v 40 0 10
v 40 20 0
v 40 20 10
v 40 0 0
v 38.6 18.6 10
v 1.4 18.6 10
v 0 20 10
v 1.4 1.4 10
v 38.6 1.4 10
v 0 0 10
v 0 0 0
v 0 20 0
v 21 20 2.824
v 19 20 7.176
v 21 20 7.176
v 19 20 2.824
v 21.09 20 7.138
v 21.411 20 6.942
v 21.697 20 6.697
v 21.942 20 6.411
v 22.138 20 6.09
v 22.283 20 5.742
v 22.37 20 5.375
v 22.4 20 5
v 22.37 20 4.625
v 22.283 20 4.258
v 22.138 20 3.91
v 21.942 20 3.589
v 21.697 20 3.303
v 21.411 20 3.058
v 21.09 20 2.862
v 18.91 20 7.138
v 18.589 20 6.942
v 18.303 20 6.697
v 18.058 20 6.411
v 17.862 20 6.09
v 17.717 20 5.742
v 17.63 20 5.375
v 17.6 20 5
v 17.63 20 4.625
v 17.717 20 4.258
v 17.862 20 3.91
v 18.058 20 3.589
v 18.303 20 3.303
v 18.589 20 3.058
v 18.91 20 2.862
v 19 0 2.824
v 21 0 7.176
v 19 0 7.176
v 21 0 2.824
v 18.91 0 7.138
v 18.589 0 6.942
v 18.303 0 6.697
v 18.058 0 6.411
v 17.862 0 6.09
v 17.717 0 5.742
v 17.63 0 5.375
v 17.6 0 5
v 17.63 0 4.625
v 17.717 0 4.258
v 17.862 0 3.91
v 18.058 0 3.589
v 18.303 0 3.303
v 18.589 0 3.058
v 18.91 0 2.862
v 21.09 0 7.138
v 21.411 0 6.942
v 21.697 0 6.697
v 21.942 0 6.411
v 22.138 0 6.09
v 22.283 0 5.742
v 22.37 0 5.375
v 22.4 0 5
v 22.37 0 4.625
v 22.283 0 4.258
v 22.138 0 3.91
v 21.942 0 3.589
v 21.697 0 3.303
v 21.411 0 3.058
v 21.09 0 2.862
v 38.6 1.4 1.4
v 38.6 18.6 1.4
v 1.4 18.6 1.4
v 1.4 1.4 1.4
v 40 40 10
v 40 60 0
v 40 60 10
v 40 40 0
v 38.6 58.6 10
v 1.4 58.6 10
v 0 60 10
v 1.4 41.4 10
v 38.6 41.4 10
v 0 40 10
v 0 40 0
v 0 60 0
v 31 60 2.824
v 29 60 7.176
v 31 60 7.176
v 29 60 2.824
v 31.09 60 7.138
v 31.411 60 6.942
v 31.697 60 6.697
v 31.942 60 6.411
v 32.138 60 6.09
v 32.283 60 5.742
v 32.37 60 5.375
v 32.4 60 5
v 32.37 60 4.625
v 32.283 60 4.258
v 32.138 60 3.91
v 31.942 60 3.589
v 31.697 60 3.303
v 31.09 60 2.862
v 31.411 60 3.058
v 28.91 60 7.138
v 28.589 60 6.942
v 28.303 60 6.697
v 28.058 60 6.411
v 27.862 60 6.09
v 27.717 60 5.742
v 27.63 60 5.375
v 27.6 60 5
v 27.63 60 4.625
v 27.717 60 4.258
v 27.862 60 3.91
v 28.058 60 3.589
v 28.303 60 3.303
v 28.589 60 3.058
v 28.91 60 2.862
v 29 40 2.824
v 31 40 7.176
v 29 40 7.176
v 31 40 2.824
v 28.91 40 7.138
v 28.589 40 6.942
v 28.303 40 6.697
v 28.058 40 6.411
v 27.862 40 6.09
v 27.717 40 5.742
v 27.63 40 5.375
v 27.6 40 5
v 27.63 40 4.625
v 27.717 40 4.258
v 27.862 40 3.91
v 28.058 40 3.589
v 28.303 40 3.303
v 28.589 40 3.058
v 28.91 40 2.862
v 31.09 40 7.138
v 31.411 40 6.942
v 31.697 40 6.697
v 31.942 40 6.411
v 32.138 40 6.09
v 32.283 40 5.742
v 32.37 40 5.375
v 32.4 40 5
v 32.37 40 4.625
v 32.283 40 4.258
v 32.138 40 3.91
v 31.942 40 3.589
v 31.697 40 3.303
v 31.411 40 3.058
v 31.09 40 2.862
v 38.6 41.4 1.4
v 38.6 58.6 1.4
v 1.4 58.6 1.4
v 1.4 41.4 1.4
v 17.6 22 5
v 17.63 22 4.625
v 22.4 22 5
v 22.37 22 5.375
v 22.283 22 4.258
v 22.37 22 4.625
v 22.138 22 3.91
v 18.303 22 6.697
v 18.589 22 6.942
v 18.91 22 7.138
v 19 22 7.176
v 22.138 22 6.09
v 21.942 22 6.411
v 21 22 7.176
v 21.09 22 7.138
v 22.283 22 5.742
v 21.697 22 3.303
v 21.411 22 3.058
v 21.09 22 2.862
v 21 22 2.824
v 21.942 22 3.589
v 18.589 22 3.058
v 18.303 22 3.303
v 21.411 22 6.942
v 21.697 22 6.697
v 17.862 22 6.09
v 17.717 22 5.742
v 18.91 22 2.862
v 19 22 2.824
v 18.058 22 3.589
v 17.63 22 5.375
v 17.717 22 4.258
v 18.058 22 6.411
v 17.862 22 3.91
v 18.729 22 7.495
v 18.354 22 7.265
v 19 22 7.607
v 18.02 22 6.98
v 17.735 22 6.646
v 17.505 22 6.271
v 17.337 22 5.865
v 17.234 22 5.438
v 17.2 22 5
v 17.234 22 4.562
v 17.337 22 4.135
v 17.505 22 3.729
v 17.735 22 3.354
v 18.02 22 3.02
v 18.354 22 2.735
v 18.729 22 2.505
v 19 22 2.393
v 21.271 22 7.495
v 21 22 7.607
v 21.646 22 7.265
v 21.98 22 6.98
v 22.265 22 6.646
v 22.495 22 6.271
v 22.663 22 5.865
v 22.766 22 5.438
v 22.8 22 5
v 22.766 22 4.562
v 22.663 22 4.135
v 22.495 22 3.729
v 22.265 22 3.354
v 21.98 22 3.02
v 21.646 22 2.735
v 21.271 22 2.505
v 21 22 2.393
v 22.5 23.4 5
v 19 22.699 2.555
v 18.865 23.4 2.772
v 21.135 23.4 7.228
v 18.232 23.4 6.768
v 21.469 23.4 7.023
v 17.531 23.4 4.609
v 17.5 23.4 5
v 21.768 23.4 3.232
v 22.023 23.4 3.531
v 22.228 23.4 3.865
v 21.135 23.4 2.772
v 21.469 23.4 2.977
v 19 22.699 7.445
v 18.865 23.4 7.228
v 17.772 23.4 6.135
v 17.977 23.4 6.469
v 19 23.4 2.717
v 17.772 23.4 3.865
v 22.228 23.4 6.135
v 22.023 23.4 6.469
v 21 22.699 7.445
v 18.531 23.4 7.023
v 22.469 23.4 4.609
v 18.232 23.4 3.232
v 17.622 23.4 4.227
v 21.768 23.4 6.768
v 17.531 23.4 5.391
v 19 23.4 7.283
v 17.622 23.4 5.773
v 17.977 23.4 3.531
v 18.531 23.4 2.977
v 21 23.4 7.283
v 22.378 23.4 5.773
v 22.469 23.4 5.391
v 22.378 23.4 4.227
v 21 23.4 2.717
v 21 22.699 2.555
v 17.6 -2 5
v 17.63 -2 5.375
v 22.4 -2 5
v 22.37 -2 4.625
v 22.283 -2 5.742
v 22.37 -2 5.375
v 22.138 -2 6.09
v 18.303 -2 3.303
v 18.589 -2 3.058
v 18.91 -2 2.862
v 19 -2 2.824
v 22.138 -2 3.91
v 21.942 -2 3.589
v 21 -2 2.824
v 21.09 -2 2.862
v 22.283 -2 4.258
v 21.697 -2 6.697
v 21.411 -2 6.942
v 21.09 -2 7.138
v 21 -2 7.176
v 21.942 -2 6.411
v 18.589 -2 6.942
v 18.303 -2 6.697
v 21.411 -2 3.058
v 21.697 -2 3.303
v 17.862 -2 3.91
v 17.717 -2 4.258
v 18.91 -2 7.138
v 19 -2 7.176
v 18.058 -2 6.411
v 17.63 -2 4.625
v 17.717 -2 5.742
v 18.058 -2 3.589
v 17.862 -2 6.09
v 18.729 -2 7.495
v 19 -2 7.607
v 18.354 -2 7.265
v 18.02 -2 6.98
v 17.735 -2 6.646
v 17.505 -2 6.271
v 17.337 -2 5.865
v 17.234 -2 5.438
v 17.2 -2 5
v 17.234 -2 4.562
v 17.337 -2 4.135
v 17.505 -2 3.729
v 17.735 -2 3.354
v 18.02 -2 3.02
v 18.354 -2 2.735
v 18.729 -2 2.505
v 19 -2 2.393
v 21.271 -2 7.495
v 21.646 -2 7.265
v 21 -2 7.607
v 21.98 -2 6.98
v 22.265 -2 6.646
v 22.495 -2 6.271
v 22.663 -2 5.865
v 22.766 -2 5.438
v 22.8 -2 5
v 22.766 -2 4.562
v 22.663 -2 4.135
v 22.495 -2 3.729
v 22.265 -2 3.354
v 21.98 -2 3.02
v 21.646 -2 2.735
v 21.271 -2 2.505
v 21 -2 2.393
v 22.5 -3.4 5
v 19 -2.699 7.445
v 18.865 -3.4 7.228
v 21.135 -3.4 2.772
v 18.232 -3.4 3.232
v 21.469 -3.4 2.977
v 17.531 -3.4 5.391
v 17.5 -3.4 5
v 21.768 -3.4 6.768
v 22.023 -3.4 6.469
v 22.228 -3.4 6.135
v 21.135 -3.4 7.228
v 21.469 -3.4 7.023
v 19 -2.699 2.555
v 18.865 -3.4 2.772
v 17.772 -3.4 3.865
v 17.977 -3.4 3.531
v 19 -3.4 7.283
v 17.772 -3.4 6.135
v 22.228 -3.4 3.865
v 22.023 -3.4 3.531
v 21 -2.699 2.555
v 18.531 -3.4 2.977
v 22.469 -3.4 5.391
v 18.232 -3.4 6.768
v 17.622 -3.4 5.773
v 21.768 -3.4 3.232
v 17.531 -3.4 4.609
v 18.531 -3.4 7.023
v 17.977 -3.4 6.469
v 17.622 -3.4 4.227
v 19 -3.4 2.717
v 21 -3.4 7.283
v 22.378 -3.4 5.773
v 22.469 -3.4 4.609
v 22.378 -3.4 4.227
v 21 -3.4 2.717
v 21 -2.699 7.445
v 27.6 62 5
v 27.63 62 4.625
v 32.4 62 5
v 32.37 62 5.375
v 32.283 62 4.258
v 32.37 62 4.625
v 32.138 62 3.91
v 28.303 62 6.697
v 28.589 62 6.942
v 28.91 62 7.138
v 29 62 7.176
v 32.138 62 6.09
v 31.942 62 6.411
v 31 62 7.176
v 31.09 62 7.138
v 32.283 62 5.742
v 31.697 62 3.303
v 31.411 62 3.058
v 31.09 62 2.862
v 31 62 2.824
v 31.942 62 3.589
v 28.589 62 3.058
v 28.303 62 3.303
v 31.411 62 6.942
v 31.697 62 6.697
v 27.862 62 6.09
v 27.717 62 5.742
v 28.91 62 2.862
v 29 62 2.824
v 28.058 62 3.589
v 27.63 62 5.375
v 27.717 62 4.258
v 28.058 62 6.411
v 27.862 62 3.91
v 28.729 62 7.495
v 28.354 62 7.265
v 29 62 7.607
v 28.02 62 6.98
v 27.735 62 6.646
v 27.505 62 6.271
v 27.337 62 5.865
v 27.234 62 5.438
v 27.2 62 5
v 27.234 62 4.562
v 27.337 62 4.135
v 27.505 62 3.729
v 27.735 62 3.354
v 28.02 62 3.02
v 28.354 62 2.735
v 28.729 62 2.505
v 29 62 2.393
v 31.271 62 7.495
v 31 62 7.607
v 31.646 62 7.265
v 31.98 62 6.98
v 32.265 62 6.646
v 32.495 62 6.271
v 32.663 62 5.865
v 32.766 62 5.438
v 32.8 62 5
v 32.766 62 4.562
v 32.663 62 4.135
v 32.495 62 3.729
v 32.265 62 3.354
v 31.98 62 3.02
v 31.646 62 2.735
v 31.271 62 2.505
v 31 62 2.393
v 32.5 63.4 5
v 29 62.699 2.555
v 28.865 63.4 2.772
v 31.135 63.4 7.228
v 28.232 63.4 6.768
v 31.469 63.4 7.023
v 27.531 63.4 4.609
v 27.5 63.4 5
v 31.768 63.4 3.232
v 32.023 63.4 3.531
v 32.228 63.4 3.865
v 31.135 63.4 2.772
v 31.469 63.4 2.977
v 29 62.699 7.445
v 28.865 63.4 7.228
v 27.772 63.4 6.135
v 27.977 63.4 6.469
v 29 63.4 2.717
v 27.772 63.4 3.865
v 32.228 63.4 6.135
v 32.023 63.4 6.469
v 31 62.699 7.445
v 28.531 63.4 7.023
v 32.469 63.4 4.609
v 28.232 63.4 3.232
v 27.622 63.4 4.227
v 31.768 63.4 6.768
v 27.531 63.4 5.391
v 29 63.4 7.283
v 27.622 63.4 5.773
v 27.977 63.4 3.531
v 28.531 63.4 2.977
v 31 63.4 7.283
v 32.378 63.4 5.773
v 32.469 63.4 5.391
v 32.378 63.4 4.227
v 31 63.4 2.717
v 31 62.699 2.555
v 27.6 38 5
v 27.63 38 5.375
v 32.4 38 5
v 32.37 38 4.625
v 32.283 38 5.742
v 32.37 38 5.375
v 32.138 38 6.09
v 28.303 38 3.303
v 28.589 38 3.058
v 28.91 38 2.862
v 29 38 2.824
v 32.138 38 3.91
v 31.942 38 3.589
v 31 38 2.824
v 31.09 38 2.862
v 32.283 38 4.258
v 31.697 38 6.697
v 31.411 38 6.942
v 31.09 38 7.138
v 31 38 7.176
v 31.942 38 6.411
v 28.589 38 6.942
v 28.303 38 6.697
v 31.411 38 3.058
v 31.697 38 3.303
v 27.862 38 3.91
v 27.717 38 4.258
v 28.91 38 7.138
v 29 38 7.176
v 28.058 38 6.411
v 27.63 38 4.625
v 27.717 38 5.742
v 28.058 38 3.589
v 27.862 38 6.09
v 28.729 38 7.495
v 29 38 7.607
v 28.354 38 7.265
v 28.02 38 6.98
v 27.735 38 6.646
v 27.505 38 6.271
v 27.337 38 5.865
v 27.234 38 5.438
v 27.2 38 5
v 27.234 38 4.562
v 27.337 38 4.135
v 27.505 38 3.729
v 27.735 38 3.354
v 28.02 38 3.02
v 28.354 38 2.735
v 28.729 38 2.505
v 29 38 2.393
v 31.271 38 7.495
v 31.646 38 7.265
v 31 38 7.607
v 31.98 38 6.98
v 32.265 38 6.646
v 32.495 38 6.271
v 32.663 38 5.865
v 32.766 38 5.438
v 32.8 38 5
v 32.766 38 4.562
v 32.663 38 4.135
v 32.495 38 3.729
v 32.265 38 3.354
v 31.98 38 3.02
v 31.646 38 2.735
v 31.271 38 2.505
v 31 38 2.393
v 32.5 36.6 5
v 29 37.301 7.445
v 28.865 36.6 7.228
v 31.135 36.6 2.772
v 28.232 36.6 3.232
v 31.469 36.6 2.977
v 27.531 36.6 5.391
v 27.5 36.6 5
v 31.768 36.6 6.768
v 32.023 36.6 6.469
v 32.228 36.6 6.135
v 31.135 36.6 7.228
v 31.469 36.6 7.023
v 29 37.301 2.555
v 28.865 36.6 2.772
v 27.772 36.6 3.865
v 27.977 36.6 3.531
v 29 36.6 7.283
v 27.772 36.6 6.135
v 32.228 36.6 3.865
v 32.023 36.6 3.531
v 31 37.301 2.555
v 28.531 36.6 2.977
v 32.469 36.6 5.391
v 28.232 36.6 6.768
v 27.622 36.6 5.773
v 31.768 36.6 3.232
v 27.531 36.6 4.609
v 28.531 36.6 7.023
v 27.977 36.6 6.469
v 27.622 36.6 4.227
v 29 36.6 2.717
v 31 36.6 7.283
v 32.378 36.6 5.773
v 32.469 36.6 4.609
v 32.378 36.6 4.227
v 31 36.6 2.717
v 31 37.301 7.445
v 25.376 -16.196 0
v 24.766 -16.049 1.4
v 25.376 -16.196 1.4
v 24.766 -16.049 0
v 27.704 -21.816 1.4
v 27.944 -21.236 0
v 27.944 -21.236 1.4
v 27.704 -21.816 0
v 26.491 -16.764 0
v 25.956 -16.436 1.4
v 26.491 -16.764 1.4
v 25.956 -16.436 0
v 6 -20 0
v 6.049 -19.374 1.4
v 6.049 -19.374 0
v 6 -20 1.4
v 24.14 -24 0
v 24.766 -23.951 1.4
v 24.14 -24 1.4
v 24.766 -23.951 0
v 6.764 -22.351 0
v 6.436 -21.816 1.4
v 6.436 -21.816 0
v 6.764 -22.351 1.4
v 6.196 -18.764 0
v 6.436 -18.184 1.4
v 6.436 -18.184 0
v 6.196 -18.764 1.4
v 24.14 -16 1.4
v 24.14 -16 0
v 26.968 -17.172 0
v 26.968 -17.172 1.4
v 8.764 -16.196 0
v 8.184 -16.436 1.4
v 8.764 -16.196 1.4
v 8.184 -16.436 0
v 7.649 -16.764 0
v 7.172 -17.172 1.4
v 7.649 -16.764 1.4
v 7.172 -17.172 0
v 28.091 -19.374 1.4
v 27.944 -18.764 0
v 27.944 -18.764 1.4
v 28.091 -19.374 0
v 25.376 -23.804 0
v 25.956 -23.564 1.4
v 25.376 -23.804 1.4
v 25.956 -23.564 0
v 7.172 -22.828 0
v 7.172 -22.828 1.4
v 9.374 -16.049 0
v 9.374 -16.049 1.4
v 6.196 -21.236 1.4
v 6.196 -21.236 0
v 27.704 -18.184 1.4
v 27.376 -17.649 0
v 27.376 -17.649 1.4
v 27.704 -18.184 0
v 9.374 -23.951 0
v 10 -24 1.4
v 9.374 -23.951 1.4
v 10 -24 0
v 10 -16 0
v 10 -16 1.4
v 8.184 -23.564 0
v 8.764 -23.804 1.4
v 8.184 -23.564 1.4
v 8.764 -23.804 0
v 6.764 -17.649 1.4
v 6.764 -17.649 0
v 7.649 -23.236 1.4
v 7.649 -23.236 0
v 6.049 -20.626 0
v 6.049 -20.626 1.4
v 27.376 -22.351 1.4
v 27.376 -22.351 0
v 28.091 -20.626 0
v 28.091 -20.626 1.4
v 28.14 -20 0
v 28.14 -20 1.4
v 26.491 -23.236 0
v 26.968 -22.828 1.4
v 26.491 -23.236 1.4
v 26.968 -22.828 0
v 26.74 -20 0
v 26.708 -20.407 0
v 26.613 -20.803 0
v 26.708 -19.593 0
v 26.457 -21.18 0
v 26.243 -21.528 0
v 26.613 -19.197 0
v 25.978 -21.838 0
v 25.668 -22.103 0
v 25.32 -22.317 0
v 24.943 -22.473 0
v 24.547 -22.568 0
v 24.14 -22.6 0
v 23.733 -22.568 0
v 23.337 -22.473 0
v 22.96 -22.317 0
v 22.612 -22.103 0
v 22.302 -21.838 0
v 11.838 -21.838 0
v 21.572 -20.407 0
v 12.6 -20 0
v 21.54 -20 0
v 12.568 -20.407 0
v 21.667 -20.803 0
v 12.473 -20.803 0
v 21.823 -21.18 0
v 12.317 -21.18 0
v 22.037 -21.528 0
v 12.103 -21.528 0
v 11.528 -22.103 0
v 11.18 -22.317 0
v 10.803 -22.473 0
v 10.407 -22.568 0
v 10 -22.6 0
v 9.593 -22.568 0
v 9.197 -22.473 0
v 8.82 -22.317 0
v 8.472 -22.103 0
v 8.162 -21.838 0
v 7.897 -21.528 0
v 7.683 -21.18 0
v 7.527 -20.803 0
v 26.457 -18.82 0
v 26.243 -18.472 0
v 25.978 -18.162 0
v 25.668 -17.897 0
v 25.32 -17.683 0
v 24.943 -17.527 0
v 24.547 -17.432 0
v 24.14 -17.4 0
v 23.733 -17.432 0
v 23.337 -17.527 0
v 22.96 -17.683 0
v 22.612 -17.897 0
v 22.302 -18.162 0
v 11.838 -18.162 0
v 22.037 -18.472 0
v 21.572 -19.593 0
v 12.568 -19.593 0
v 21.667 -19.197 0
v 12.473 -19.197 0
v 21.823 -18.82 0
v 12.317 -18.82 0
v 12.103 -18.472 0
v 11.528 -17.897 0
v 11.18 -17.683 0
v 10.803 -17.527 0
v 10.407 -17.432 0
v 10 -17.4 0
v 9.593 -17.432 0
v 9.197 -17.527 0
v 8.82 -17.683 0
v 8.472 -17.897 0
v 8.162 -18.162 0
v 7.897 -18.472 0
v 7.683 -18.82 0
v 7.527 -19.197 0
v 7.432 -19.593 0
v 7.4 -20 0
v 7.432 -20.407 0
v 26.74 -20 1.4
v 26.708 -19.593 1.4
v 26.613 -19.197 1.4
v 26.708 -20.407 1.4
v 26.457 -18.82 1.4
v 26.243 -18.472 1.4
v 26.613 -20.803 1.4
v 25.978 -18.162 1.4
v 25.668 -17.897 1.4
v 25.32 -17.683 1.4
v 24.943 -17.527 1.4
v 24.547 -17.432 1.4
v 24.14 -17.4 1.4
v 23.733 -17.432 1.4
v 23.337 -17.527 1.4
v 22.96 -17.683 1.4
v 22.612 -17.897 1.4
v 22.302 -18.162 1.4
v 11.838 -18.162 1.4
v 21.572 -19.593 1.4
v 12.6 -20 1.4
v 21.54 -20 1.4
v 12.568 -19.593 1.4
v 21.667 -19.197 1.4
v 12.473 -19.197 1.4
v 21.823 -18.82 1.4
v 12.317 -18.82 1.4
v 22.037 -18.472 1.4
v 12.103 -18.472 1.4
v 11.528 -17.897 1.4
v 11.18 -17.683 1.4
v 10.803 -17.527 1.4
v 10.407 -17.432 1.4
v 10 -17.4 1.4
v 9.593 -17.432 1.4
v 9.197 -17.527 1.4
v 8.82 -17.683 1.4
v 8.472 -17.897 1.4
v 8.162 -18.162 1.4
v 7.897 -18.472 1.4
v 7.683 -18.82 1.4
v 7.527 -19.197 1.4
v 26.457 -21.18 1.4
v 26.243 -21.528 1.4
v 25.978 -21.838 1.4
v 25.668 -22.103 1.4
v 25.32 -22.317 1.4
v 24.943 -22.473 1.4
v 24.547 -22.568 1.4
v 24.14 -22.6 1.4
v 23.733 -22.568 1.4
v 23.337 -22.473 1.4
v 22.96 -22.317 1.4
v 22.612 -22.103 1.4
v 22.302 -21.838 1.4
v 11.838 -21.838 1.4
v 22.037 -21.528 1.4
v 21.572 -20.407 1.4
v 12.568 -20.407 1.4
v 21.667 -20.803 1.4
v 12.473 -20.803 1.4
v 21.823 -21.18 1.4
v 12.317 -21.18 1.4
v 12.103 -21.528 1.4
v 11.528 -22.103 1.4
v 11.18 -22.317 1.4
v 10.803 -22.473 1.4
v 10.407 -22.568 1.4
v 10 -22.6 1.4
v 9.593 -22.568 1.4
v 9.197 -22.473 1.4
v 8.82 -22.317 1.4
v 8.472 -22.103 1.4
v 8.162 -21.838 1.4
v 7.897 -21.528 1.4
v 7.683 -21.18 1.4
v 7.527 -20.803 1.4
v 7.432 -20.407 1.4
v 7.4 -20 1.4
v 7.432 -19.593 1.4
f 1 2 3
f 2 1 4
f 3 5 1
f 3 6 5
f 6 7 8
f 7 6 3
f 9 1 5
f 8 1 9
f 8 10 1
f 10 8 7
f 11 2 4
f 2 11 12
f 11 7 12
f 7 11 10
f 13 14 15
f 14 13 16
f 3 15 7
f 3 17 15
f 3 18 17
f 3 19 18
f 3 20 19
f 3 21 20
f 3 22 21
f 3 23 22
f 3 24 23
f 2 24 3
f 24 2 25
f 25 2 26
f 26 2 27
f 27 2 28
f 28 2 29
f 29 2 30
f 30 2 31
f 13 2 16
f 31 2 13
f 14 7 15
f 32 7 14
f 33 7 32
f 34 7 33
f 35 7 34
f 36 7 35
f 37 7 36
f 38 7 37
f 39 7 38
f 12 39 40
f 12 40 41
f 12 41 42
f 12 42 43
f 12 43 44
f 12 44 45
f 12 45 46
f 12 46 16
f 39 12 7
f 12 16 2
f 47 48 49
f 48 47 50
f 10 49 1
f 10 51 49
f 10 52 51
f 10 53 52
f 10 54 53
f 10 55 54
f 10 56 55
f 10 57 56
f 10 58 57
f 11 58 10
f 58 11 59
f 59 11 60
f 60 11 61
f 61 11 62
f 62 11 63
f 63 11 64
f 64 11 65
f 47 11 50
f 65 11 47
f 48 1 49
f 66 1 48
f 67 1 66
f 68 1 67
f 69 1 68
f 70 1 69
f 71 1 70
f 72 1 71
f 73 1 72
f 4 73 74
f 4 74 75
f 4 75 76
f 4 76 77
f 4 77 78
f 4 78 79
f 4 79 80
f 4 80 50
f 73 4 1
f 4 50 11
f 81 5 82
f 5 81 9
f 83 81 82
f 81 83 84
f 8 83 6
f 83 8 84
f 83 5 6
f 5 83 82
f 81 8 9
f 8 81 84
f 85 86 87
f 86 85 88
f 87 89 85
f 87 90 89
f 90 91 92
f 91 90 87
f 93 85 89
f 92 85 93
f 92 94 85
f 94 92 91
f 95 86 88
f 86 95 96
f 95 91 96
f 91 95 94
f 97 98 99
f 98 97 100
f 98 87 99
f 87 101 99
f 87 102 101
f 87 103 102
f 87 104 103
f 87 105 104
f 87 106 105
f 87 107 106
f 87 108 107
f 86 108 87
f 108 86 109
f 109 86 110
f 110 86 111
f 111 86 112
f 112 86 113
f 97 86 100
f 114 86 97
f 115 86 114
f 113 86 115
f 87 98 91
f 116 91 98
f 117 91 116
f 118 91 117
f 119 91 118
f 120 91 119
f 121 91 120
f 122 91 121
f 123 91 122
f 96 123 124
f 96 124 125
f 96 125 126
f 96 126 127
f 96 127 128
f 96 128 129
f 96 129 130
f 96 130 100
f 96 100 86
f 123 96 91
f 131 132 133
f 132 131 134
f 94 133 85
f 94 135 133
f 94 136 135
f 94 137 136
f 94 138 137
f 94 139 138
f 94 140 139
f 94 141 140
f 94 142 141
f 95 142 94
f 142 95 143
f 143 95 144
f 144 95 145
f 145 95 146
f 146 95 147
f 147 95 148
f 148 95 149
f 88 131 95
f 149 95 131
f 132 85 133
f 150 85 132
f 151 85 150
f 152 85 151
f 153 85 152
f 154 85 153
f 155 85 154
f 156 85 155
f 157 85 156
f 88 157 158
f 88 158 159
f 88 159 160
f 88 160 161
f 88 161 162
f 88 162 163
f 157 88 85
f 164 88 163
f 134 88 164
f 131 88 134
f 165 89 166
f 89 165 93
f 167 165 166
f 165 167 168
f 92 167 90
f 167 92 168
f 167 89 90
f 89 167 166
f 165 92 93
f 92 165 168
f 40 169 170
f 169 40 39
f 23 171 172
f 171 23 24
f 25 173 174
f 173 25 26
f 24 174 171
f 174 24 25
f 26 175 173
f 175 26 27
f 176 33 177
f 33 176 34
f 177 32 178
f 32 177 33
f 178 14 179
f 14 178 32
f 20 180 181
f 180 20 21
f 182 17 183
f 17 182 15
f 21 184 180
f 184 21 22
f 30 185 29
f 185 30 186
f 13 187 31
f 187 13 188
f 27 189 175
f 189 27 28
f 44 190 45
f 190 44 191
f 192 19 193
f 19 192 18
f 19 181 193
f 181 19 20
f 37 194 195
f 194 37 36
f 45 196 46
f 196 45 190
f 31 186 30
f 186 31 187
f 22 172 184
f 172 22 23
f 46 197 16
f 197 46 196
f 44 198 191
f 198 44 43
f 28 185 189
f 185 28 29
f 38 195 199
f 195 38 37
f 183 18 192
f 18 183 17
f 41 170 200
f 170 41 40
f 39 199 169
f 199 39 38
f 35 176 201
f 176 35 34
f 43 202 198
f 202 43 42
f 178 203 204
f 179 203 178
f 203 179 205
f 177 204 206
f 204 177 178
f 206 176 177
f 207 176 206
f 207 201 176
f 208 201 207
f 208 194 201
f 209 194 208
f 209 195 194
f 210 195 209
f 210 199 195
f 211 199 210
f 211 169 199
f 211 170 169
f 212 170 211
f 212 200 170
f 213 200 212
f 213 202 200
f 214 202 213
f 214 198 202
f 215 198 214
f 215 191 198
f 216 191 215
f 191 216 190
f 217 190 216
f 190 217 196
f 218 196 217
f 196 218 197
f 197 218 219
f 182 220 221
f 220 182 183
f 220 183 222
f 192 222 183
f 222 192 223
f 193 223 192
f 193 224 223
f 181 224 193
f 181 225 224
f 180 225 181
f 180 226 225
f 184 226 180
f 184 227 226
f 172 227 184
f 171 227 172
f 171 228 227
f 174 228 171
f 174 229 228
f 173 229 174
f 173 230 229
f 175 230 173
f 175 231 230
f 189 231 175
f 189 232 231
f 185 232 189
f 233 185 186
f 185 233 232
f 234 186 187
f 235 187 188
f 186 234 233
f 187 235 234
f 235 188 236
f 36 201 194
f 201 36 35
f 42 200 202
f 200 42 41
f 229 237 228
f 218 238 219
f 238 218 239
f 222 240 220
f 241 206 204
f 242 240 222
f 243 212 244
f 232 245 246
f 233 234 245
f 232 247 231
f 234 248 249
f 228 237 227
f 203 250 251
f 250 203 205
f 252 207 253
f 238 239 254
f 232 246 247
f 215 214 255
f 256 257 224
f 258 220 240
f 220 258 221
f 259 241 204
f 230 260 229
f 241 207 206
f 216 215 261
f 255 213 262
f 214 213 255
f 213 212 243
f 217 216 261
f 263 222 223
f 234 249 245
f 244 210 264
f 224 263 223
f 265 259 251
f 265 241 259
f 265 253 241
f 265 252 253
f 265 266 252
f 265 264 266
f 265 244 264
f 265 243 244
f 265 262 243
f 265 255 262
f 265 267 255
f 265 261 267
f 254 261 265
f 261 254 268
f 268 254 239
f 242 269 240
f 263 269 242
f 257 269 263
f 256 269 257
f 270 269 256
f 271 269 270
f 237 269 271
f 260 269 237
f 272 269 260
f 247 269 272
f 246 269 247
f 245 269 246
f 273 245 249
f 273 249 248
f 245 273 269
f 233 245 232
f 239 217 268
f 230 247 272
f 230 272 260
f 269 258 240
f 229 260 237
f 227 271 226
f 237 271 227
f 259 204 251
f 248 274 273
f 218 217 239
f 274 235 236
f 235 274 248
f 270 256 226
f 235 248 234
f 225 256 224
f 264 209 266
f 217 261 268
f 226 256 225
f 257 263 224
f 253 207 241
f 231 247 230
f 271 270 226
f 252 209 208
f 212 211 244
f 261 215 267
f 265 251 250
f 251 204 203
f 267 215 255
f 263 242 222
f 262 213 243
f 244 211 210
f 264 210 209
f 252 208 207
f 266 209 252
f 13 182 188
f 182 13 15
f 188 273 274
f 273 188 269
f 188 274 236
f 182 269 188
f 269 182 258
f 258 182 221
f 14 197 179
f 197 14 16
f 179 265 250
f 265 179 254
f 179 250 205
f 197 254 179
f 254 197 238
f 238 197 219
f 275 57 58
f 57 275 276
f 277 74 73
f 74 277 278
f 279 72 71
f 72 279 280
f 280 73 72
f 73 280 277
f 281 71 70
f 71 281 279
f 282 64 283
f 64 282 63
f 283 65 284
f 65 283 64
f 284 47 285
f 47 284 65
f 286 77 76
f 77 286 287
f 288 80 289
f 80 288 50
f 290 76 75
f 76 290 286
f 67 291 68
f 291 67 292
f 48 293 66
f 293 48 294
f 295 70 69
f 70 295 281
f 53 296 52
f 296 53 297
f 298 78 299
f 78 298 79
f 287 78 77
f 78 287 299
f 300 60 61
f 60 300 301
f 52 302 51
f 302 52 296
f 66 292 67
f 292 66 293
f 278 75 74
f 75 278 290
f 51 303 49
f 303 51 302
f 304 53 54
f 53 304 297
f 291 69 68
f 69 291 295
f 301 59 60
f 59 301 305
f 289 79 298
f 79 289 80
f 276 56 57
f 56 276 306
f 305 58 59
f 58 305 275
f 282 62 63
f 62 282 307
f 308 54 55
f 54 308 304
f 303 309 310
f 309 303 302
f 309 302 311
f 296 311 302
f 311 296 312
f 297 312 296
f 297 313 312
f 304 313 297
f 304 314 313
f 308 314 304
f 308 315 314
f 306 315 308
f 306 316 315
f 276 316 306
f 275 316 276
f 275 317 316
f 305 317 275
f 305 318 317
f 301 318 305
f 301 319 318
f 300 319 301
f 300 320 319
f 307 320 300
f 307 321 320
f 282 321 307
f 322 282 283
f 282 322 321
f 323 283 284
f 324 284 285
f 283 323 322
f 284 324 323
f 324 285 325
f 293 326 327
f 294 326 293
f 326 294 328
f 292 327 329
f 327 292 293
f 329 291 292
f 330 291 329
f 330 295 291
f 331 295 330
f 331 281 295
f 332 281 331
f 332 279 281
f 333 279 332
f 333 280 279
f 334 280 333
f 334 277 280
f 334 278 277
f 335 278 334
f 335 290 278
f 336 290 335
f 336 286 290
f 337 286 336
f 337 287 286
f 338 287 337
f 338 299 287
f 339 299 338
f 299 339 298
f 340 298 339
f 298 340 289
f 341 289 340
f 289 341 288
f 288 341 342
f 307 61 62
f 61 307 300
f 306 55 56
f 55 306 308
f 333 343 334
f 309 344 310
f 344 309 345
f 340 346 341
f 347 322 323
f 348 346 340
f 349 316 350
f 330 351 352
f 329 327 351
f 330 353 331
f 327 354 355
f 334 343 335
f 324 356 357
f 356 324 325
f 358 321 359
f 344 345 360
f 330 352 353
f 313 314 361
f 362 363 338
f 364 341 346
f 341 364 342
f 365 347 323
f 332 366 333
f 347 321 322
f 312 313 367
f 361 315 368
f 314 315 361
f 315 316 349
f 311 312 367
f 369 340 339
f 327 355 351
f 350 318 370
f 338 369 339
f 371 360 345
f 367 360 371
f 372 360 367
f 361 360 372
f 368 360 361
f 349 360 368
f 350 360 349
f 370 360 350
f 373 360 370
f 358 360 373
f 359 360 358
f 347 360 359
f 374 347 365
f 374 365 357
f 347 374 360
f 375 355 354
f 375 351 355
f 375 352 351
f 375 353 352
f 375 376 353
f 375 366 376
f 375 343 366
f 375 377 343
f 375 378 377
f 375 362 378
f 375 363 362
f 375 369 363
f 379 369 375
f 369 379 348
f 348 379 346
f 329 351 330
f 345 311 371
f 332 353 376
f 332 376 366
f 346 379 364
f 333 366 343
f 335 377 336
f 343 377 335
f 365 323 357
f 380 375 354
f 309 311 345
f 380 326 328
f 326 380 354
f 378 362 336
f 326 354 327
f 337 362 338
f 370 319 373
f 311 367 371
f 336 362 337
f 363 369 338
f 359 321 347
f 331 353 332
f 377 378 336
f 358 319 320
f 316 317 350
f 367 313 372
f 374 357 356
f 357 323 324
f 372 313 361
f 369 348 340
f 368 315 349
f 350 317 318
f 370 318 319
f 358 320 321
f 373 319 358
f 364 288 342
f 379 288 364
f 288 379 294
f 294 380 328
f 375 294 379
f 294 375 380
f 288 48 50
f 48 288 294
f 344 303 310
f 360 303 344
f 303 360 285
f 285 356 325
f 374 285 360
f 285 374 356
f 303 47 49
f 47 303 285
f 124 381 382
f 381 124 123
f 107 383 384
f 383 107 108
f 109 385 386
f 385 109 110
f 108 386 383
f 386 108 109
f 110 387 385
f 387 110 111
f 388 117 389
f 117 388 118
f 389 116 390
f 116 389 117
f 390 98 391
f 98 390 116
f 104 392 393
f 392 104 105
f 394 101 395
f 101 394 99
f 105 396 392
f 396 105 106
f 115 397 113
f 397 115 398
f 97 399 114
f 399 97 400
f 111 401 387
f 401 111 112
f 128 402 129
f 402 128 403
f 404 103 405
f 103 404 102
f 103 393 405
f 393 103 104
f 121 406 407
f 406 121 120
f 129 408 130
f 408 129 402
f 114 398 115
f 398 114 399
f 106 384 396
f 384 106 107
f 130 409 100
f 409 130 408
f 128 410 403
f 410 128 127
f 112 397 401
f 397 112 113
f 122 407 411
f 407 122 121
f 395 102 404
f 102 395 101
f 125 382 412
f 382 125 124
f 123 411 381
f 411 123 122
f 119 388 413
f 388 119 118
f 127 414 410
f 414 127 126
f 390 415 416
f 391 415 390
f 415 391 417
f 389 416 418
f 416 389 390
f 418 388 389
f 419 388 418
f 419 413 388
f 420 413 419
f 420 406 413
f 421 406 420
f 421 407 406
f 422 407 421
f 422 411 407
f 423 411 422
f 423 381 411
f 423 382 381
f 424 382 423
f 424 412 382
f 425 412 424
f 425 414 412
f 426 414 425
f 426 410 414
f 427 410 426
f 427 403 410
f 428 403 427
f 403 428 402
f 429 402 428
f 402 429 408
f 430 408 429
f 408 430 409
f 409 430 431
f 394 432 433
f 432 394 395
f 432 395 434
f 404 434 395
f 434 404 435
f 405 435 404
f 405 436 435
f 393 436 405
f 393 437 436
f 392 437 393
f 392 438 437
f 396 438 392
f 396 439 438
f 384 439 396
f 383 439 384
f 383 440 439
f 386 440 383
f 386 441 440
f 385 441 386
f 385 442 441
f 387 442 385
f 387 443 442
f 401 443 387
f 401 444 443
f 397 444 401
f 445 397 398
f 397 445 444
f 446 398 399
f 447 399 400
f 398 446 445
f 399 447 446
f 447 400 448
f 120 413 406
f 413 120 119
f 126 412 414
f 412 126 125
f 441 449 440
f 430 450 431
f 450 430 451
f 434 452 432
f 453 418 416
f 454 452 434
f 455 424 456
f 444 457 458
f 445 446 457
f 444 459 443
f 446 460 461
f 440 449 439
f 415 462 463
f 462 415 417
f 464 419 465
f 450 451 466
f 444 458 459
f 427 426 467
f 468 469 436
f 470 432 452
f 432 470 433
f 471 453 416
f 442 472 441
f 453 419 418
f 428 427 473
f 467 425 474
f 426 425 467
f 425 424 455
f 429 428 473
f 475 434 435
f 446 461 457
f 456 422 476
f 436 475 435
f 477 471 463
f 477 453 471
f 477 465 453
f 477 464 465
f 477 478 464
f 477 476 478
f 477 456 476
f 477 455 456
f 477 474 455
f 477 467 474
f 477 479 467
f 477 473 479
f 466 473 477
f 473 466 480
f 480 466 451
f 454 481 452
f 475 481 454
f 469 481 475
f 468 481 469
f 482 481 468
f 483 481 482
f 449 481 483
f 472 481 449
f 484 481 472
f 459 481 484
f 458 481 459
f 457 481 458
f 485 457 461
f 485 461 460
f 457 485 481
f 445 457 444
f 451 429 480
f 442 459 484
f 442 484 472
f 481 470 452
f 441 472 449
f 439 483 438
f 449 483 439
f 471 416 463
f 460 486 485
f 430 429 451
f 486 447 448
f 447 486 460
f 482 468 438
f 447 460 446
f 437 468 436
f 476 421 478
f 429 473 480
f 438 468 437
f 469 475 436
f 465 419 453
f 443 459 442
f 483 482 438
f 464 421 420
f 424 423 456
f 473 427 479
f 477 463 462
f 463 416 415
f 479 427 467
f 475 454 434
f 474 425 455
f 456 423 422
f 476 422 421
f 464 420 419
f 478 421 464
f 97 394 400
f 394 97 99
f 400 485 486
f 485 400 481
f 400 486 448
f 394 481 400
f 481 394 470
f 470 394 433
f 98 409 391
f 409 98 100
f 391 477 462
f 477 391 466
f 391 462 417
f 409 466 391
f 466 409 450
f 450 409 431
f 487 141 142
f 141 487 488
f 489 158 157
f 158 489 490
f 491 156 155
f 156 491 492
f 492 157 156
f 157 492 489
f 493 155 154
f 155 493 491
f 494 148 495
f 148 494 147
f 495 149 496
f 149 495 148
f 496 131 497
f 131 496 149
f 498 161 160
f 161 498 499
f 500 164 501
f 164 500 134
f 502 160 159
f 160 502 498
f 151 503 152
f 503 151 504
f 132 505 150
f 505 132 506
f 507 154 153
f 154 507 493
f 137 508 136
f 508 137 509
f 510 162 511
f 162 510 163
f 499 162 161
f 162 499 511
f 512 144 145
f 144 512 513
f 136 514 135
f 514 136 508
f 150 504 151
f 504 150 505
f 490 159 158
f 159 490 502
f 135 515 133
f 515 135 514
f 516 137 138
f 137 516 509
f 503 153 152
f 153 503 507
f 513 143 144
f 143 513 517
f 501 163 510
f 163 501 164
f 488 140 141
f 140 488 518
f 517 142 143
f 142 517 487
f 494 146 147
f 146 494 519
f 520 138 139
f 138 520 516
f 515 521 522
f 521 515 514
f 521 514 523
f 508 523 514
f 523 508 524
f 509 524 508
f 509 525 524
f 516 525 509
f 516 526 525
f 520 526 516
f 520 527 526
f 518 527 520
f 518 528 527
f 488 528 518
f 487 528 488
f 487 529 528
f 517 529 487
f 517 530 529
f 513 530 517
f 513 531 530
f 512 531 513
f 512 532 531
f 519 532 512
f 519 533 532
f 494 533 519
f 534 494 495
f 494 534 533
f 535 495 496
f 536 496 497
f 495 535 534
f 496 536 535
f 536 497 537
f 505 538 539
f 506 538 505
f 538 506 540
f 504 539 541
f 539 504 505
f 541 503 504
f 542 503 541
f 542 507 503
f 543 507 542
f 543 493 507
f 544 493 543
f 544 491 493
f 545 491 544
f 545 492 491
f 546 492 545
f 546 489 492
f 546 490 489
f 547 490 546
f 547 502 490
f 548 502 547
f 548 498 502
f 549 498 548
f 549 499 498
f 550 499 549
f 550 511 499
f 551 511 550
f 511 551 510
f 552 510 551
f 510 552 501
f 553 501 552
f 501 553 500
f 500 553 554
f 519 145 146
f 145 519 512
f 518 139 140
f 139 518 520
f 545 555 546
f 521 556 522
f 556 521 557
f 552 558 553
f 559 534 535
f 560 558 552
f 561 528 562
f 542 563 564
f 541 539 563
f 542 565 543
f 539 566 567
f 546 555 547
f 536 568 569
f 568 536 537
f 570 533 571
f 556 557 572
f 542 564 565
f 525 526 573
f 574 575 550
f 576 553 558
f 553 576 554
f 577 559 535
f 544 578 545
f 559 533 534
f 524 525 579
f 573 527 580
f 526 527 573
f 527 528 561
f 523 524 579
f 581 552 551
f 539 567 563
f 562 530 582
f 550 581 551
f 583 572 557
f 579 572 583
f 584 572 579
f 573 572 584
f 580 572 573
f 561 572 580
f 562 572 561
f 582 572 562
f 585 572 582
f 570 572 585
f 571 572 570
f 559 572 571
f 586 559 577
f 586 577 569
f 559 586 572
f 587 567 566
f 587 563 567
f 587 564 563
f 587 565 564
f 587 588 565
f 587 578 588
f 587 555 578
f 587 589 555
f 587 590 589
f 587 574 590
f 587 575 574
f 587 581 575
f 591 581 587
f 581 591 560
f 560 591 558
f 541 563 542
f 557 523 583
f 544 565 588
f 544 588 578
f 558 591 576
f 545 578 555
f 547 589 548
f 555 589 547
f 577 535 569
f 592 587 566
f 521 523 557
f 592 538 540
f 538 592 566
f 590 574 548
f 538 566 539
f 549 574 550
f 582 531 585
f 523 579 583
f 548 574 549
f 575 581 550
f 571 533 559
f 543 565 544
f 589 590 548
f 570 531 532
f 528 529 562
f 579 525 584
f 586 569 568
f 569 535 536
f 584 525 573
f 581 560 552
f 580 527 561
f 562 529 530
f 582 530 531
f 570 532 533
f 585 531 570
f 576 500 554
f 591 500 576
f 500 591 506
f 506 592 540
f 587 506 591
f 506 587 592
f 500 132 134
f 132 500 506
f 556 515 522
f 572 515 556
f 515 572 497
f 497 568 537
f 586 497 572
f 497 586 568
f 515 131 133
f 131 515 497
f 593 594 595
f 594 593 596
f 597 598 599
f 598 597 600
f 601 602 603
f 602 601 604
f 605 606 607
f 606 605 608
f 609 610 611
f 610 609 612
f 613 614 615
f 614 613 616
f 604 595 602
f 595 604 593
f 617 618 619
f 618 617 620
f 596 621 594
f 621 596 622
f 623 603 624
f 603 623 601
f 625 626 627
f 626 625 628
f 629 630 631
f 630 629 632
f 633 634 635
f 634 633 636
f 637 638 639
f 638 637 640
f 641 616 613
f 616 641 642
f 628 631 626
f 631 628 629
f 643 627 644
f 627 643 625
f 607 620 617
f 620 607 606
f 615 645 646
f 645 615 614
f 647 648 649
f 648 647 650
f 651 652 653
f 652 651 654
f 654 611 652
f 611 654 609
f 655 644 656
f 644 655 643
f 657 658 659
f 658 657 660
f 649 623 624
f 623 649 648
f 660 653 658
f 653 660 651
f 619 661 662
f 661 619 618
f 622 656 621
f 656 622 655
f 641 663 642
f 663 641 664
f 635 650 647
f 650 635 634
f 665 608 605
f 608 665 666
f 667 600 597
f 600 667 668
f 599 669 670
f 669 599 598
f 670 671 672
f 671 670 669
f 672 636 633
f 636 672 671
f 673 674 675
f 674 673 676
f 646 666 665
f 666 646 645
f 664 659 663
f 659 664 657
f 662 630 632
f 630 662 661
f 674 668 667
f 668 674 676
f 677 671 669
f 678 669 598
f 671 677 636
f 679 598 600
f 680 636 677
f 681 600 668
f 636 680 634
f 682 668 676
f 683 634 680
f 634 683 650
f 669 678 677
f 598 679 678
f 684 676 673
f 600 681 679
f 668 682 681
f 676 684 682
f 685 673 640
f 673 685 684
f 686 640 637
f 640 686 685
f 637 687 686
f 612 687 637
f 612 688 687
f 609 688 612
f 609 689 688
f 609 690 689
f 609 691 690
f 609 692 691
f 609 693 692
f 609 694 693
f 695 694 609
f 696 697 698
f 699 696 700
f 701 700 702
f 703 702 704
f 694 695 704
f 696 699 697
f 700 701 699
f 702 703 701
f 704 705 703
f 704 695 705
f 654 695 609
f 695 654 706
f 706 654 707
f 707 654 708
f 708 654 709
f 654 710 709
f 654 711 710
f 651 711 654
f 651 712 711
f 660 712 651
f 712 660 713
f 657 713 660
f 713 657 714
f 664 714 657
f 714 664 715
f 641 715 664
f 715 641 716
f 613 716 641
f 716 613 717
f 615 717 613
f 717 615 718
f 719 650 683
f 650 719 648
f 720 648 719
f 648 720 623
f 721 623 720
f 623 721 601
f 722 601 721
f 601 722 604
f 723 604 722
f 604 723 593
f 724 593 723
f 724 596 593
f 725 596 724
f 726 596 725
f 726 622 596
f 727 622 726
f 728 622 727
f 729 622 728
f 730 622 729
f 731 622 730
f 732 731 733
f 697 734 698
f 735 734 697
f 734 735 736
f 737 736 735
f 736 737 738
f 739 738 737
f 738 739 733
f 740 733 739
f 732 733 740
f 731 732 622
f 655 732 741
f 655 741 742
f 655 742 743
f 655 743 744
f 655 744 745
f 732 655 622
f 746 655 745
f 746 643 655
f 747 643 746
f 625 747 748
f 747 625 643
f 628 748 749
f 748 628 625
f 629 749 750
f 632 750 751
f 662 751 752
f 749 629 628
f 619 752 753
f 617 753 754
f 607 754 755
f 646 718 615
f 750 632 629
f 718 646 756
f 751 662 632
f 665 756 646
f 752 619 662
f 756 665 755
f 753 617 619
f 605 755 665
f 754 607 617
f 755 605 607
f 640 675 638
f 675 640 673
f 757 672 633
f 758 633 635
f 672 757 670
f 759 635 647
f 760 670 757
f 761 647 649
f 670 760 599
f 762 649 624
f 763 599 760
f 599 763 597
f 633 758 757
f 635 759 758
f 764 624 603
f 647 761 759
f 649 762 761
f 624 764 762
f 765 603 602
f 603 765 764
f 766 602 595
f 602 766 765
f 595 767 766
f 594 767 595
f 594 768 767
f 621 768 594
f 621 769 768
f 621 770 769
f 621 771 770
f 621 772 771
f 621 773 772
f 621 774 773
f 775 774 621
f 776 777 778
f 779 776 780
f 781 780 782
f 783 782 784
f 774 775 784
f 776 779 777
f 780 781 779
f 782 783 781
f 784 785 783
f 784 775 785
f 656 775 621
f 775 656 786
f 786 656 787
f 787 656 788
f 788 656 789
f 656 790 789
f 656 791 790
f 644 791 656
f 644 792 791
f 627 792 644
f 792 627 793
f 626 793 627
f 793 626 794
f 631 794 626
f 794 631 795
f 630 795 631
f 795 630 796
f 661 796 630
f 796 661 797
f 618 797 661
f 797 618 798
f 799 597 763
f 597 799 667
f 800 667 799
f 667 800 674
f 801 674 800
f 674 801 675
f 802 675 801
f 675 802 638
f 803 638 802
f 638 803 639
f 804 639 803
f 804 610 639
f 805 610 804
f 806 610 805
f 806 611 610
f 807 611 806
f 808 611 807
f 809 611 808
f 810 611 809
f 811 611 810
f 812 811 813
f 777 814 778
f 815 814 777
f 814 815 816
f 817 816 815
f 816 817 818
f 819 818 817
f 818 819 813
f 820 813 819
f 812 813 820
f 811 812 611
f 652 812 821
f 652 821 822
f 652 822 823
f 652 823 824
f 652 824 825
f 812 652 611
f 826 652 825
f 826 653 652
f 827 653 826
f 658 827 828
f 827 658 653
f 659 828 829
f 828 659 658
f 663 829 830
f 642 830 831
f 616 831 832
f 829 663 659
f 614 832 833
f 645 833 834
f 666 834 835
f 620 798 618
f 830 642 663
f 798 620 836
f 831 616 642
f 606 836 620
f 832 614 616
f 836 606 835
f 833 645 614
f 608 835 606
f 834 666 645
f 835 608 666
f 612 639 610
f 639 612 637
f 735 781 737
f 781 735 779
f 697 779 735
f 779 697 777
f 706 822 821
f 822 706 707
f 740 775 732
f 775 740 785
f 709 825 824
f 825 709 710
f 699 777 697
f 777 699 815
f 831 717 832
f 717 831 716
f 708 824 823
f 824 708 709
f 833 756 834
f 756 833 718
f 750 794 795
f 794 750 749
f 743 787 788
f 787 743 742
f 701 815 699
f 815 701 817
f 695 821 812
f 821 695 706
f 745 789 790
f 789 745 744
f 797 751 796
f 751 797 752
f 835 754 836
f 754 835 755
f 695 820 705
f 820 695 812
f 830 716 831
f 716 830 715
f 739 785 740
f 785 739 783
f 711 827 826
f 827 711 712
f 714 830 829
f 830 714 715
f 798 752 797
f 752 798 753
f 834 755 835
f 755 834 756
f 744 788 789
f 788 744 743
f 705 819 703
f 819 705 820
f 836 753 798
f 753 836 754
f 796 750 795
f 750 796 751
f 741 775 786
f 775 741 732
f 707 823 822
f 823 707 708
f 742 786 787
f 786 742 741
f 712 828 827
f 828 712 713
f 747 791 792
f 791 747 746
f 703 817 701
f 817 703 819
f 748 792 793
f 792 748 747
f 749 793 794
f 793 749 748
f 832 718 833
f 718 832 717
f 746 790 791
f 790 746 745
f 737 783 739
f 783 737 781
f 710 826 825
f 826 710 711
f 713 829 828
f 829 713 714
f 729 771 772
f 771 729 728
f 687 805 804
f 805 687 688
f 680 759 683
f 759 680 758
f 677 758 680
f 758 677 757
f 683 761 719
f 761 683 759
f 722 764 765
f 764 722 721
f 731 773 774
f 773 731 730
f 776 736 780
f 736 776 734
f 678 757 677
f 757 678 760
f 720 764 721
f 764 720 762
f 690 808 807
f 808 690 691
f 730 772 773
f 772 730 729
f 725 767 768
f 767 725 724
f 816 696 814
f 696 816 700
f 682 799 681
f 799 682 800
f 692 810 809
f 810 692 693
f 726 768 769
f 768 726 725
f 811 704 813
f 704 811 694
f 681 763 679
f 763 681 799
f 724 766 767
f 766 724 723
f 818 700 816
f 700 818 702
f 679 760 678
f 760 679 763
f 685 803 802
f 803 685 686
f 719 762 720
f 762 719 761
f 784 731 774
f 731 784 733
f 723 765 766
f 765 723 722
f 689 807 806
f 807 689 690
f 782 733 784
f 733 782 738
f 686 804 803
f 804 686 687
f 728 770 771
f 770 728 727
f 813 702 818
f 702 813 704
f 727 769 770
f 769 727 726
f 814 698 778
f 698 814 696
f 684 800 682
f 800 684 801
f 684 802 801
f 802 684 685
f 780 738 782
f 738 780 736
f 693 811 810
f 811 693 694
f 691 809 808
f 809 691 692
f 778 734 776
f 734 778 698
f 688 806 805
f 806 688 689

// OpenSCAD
$fn=40;

Tol = 0.1;

module Box (){
difference() {
    cube ([40,20,10]);
    translate([1.4,1.4,1.4])cube ([40-2.8,20-2.8,10]);
}
}

module nub(ipH=2, ipR=2.5, ipLip = 0.4) {
difference() 
    {        
     union() 
       {
       cylinder(r1=ipR-Tol, r2=ipR-Tol, h=ipH);
       translate([0,0,ipH])cylinder(r1=ipR-Tol+ipLip, r2=ipR, h=1.4);
       }      
    cube([2,50,50],center=true);         
    }
}

Box();
translate([0,40,0])Box();

translate([20,20,5])rotate([-90,0,0])nub(ipH=2);
translate([20,0,5])rotate([90,0,0])nub(ipH=2);

translate([30,60,5])rotate([-90,0,0])nub(ipH=2);
translate([30,40,5])rotate([90,0,0])nub(ipH=2);

// Connector
translate([10,-20,0]) difference(){
    hull() {
      cylinder(r1=4,r2=4,h=1.4);
       translate([14.14,0,0]) cylinder(r1=4,r2=4,   h=1.4);
      }
      cylinder(r1=2.6,r2=2.6,h=5);
      translate([14.14,0,0]) cylinder(r1=2.6,r2=2.6,h=5);
}
